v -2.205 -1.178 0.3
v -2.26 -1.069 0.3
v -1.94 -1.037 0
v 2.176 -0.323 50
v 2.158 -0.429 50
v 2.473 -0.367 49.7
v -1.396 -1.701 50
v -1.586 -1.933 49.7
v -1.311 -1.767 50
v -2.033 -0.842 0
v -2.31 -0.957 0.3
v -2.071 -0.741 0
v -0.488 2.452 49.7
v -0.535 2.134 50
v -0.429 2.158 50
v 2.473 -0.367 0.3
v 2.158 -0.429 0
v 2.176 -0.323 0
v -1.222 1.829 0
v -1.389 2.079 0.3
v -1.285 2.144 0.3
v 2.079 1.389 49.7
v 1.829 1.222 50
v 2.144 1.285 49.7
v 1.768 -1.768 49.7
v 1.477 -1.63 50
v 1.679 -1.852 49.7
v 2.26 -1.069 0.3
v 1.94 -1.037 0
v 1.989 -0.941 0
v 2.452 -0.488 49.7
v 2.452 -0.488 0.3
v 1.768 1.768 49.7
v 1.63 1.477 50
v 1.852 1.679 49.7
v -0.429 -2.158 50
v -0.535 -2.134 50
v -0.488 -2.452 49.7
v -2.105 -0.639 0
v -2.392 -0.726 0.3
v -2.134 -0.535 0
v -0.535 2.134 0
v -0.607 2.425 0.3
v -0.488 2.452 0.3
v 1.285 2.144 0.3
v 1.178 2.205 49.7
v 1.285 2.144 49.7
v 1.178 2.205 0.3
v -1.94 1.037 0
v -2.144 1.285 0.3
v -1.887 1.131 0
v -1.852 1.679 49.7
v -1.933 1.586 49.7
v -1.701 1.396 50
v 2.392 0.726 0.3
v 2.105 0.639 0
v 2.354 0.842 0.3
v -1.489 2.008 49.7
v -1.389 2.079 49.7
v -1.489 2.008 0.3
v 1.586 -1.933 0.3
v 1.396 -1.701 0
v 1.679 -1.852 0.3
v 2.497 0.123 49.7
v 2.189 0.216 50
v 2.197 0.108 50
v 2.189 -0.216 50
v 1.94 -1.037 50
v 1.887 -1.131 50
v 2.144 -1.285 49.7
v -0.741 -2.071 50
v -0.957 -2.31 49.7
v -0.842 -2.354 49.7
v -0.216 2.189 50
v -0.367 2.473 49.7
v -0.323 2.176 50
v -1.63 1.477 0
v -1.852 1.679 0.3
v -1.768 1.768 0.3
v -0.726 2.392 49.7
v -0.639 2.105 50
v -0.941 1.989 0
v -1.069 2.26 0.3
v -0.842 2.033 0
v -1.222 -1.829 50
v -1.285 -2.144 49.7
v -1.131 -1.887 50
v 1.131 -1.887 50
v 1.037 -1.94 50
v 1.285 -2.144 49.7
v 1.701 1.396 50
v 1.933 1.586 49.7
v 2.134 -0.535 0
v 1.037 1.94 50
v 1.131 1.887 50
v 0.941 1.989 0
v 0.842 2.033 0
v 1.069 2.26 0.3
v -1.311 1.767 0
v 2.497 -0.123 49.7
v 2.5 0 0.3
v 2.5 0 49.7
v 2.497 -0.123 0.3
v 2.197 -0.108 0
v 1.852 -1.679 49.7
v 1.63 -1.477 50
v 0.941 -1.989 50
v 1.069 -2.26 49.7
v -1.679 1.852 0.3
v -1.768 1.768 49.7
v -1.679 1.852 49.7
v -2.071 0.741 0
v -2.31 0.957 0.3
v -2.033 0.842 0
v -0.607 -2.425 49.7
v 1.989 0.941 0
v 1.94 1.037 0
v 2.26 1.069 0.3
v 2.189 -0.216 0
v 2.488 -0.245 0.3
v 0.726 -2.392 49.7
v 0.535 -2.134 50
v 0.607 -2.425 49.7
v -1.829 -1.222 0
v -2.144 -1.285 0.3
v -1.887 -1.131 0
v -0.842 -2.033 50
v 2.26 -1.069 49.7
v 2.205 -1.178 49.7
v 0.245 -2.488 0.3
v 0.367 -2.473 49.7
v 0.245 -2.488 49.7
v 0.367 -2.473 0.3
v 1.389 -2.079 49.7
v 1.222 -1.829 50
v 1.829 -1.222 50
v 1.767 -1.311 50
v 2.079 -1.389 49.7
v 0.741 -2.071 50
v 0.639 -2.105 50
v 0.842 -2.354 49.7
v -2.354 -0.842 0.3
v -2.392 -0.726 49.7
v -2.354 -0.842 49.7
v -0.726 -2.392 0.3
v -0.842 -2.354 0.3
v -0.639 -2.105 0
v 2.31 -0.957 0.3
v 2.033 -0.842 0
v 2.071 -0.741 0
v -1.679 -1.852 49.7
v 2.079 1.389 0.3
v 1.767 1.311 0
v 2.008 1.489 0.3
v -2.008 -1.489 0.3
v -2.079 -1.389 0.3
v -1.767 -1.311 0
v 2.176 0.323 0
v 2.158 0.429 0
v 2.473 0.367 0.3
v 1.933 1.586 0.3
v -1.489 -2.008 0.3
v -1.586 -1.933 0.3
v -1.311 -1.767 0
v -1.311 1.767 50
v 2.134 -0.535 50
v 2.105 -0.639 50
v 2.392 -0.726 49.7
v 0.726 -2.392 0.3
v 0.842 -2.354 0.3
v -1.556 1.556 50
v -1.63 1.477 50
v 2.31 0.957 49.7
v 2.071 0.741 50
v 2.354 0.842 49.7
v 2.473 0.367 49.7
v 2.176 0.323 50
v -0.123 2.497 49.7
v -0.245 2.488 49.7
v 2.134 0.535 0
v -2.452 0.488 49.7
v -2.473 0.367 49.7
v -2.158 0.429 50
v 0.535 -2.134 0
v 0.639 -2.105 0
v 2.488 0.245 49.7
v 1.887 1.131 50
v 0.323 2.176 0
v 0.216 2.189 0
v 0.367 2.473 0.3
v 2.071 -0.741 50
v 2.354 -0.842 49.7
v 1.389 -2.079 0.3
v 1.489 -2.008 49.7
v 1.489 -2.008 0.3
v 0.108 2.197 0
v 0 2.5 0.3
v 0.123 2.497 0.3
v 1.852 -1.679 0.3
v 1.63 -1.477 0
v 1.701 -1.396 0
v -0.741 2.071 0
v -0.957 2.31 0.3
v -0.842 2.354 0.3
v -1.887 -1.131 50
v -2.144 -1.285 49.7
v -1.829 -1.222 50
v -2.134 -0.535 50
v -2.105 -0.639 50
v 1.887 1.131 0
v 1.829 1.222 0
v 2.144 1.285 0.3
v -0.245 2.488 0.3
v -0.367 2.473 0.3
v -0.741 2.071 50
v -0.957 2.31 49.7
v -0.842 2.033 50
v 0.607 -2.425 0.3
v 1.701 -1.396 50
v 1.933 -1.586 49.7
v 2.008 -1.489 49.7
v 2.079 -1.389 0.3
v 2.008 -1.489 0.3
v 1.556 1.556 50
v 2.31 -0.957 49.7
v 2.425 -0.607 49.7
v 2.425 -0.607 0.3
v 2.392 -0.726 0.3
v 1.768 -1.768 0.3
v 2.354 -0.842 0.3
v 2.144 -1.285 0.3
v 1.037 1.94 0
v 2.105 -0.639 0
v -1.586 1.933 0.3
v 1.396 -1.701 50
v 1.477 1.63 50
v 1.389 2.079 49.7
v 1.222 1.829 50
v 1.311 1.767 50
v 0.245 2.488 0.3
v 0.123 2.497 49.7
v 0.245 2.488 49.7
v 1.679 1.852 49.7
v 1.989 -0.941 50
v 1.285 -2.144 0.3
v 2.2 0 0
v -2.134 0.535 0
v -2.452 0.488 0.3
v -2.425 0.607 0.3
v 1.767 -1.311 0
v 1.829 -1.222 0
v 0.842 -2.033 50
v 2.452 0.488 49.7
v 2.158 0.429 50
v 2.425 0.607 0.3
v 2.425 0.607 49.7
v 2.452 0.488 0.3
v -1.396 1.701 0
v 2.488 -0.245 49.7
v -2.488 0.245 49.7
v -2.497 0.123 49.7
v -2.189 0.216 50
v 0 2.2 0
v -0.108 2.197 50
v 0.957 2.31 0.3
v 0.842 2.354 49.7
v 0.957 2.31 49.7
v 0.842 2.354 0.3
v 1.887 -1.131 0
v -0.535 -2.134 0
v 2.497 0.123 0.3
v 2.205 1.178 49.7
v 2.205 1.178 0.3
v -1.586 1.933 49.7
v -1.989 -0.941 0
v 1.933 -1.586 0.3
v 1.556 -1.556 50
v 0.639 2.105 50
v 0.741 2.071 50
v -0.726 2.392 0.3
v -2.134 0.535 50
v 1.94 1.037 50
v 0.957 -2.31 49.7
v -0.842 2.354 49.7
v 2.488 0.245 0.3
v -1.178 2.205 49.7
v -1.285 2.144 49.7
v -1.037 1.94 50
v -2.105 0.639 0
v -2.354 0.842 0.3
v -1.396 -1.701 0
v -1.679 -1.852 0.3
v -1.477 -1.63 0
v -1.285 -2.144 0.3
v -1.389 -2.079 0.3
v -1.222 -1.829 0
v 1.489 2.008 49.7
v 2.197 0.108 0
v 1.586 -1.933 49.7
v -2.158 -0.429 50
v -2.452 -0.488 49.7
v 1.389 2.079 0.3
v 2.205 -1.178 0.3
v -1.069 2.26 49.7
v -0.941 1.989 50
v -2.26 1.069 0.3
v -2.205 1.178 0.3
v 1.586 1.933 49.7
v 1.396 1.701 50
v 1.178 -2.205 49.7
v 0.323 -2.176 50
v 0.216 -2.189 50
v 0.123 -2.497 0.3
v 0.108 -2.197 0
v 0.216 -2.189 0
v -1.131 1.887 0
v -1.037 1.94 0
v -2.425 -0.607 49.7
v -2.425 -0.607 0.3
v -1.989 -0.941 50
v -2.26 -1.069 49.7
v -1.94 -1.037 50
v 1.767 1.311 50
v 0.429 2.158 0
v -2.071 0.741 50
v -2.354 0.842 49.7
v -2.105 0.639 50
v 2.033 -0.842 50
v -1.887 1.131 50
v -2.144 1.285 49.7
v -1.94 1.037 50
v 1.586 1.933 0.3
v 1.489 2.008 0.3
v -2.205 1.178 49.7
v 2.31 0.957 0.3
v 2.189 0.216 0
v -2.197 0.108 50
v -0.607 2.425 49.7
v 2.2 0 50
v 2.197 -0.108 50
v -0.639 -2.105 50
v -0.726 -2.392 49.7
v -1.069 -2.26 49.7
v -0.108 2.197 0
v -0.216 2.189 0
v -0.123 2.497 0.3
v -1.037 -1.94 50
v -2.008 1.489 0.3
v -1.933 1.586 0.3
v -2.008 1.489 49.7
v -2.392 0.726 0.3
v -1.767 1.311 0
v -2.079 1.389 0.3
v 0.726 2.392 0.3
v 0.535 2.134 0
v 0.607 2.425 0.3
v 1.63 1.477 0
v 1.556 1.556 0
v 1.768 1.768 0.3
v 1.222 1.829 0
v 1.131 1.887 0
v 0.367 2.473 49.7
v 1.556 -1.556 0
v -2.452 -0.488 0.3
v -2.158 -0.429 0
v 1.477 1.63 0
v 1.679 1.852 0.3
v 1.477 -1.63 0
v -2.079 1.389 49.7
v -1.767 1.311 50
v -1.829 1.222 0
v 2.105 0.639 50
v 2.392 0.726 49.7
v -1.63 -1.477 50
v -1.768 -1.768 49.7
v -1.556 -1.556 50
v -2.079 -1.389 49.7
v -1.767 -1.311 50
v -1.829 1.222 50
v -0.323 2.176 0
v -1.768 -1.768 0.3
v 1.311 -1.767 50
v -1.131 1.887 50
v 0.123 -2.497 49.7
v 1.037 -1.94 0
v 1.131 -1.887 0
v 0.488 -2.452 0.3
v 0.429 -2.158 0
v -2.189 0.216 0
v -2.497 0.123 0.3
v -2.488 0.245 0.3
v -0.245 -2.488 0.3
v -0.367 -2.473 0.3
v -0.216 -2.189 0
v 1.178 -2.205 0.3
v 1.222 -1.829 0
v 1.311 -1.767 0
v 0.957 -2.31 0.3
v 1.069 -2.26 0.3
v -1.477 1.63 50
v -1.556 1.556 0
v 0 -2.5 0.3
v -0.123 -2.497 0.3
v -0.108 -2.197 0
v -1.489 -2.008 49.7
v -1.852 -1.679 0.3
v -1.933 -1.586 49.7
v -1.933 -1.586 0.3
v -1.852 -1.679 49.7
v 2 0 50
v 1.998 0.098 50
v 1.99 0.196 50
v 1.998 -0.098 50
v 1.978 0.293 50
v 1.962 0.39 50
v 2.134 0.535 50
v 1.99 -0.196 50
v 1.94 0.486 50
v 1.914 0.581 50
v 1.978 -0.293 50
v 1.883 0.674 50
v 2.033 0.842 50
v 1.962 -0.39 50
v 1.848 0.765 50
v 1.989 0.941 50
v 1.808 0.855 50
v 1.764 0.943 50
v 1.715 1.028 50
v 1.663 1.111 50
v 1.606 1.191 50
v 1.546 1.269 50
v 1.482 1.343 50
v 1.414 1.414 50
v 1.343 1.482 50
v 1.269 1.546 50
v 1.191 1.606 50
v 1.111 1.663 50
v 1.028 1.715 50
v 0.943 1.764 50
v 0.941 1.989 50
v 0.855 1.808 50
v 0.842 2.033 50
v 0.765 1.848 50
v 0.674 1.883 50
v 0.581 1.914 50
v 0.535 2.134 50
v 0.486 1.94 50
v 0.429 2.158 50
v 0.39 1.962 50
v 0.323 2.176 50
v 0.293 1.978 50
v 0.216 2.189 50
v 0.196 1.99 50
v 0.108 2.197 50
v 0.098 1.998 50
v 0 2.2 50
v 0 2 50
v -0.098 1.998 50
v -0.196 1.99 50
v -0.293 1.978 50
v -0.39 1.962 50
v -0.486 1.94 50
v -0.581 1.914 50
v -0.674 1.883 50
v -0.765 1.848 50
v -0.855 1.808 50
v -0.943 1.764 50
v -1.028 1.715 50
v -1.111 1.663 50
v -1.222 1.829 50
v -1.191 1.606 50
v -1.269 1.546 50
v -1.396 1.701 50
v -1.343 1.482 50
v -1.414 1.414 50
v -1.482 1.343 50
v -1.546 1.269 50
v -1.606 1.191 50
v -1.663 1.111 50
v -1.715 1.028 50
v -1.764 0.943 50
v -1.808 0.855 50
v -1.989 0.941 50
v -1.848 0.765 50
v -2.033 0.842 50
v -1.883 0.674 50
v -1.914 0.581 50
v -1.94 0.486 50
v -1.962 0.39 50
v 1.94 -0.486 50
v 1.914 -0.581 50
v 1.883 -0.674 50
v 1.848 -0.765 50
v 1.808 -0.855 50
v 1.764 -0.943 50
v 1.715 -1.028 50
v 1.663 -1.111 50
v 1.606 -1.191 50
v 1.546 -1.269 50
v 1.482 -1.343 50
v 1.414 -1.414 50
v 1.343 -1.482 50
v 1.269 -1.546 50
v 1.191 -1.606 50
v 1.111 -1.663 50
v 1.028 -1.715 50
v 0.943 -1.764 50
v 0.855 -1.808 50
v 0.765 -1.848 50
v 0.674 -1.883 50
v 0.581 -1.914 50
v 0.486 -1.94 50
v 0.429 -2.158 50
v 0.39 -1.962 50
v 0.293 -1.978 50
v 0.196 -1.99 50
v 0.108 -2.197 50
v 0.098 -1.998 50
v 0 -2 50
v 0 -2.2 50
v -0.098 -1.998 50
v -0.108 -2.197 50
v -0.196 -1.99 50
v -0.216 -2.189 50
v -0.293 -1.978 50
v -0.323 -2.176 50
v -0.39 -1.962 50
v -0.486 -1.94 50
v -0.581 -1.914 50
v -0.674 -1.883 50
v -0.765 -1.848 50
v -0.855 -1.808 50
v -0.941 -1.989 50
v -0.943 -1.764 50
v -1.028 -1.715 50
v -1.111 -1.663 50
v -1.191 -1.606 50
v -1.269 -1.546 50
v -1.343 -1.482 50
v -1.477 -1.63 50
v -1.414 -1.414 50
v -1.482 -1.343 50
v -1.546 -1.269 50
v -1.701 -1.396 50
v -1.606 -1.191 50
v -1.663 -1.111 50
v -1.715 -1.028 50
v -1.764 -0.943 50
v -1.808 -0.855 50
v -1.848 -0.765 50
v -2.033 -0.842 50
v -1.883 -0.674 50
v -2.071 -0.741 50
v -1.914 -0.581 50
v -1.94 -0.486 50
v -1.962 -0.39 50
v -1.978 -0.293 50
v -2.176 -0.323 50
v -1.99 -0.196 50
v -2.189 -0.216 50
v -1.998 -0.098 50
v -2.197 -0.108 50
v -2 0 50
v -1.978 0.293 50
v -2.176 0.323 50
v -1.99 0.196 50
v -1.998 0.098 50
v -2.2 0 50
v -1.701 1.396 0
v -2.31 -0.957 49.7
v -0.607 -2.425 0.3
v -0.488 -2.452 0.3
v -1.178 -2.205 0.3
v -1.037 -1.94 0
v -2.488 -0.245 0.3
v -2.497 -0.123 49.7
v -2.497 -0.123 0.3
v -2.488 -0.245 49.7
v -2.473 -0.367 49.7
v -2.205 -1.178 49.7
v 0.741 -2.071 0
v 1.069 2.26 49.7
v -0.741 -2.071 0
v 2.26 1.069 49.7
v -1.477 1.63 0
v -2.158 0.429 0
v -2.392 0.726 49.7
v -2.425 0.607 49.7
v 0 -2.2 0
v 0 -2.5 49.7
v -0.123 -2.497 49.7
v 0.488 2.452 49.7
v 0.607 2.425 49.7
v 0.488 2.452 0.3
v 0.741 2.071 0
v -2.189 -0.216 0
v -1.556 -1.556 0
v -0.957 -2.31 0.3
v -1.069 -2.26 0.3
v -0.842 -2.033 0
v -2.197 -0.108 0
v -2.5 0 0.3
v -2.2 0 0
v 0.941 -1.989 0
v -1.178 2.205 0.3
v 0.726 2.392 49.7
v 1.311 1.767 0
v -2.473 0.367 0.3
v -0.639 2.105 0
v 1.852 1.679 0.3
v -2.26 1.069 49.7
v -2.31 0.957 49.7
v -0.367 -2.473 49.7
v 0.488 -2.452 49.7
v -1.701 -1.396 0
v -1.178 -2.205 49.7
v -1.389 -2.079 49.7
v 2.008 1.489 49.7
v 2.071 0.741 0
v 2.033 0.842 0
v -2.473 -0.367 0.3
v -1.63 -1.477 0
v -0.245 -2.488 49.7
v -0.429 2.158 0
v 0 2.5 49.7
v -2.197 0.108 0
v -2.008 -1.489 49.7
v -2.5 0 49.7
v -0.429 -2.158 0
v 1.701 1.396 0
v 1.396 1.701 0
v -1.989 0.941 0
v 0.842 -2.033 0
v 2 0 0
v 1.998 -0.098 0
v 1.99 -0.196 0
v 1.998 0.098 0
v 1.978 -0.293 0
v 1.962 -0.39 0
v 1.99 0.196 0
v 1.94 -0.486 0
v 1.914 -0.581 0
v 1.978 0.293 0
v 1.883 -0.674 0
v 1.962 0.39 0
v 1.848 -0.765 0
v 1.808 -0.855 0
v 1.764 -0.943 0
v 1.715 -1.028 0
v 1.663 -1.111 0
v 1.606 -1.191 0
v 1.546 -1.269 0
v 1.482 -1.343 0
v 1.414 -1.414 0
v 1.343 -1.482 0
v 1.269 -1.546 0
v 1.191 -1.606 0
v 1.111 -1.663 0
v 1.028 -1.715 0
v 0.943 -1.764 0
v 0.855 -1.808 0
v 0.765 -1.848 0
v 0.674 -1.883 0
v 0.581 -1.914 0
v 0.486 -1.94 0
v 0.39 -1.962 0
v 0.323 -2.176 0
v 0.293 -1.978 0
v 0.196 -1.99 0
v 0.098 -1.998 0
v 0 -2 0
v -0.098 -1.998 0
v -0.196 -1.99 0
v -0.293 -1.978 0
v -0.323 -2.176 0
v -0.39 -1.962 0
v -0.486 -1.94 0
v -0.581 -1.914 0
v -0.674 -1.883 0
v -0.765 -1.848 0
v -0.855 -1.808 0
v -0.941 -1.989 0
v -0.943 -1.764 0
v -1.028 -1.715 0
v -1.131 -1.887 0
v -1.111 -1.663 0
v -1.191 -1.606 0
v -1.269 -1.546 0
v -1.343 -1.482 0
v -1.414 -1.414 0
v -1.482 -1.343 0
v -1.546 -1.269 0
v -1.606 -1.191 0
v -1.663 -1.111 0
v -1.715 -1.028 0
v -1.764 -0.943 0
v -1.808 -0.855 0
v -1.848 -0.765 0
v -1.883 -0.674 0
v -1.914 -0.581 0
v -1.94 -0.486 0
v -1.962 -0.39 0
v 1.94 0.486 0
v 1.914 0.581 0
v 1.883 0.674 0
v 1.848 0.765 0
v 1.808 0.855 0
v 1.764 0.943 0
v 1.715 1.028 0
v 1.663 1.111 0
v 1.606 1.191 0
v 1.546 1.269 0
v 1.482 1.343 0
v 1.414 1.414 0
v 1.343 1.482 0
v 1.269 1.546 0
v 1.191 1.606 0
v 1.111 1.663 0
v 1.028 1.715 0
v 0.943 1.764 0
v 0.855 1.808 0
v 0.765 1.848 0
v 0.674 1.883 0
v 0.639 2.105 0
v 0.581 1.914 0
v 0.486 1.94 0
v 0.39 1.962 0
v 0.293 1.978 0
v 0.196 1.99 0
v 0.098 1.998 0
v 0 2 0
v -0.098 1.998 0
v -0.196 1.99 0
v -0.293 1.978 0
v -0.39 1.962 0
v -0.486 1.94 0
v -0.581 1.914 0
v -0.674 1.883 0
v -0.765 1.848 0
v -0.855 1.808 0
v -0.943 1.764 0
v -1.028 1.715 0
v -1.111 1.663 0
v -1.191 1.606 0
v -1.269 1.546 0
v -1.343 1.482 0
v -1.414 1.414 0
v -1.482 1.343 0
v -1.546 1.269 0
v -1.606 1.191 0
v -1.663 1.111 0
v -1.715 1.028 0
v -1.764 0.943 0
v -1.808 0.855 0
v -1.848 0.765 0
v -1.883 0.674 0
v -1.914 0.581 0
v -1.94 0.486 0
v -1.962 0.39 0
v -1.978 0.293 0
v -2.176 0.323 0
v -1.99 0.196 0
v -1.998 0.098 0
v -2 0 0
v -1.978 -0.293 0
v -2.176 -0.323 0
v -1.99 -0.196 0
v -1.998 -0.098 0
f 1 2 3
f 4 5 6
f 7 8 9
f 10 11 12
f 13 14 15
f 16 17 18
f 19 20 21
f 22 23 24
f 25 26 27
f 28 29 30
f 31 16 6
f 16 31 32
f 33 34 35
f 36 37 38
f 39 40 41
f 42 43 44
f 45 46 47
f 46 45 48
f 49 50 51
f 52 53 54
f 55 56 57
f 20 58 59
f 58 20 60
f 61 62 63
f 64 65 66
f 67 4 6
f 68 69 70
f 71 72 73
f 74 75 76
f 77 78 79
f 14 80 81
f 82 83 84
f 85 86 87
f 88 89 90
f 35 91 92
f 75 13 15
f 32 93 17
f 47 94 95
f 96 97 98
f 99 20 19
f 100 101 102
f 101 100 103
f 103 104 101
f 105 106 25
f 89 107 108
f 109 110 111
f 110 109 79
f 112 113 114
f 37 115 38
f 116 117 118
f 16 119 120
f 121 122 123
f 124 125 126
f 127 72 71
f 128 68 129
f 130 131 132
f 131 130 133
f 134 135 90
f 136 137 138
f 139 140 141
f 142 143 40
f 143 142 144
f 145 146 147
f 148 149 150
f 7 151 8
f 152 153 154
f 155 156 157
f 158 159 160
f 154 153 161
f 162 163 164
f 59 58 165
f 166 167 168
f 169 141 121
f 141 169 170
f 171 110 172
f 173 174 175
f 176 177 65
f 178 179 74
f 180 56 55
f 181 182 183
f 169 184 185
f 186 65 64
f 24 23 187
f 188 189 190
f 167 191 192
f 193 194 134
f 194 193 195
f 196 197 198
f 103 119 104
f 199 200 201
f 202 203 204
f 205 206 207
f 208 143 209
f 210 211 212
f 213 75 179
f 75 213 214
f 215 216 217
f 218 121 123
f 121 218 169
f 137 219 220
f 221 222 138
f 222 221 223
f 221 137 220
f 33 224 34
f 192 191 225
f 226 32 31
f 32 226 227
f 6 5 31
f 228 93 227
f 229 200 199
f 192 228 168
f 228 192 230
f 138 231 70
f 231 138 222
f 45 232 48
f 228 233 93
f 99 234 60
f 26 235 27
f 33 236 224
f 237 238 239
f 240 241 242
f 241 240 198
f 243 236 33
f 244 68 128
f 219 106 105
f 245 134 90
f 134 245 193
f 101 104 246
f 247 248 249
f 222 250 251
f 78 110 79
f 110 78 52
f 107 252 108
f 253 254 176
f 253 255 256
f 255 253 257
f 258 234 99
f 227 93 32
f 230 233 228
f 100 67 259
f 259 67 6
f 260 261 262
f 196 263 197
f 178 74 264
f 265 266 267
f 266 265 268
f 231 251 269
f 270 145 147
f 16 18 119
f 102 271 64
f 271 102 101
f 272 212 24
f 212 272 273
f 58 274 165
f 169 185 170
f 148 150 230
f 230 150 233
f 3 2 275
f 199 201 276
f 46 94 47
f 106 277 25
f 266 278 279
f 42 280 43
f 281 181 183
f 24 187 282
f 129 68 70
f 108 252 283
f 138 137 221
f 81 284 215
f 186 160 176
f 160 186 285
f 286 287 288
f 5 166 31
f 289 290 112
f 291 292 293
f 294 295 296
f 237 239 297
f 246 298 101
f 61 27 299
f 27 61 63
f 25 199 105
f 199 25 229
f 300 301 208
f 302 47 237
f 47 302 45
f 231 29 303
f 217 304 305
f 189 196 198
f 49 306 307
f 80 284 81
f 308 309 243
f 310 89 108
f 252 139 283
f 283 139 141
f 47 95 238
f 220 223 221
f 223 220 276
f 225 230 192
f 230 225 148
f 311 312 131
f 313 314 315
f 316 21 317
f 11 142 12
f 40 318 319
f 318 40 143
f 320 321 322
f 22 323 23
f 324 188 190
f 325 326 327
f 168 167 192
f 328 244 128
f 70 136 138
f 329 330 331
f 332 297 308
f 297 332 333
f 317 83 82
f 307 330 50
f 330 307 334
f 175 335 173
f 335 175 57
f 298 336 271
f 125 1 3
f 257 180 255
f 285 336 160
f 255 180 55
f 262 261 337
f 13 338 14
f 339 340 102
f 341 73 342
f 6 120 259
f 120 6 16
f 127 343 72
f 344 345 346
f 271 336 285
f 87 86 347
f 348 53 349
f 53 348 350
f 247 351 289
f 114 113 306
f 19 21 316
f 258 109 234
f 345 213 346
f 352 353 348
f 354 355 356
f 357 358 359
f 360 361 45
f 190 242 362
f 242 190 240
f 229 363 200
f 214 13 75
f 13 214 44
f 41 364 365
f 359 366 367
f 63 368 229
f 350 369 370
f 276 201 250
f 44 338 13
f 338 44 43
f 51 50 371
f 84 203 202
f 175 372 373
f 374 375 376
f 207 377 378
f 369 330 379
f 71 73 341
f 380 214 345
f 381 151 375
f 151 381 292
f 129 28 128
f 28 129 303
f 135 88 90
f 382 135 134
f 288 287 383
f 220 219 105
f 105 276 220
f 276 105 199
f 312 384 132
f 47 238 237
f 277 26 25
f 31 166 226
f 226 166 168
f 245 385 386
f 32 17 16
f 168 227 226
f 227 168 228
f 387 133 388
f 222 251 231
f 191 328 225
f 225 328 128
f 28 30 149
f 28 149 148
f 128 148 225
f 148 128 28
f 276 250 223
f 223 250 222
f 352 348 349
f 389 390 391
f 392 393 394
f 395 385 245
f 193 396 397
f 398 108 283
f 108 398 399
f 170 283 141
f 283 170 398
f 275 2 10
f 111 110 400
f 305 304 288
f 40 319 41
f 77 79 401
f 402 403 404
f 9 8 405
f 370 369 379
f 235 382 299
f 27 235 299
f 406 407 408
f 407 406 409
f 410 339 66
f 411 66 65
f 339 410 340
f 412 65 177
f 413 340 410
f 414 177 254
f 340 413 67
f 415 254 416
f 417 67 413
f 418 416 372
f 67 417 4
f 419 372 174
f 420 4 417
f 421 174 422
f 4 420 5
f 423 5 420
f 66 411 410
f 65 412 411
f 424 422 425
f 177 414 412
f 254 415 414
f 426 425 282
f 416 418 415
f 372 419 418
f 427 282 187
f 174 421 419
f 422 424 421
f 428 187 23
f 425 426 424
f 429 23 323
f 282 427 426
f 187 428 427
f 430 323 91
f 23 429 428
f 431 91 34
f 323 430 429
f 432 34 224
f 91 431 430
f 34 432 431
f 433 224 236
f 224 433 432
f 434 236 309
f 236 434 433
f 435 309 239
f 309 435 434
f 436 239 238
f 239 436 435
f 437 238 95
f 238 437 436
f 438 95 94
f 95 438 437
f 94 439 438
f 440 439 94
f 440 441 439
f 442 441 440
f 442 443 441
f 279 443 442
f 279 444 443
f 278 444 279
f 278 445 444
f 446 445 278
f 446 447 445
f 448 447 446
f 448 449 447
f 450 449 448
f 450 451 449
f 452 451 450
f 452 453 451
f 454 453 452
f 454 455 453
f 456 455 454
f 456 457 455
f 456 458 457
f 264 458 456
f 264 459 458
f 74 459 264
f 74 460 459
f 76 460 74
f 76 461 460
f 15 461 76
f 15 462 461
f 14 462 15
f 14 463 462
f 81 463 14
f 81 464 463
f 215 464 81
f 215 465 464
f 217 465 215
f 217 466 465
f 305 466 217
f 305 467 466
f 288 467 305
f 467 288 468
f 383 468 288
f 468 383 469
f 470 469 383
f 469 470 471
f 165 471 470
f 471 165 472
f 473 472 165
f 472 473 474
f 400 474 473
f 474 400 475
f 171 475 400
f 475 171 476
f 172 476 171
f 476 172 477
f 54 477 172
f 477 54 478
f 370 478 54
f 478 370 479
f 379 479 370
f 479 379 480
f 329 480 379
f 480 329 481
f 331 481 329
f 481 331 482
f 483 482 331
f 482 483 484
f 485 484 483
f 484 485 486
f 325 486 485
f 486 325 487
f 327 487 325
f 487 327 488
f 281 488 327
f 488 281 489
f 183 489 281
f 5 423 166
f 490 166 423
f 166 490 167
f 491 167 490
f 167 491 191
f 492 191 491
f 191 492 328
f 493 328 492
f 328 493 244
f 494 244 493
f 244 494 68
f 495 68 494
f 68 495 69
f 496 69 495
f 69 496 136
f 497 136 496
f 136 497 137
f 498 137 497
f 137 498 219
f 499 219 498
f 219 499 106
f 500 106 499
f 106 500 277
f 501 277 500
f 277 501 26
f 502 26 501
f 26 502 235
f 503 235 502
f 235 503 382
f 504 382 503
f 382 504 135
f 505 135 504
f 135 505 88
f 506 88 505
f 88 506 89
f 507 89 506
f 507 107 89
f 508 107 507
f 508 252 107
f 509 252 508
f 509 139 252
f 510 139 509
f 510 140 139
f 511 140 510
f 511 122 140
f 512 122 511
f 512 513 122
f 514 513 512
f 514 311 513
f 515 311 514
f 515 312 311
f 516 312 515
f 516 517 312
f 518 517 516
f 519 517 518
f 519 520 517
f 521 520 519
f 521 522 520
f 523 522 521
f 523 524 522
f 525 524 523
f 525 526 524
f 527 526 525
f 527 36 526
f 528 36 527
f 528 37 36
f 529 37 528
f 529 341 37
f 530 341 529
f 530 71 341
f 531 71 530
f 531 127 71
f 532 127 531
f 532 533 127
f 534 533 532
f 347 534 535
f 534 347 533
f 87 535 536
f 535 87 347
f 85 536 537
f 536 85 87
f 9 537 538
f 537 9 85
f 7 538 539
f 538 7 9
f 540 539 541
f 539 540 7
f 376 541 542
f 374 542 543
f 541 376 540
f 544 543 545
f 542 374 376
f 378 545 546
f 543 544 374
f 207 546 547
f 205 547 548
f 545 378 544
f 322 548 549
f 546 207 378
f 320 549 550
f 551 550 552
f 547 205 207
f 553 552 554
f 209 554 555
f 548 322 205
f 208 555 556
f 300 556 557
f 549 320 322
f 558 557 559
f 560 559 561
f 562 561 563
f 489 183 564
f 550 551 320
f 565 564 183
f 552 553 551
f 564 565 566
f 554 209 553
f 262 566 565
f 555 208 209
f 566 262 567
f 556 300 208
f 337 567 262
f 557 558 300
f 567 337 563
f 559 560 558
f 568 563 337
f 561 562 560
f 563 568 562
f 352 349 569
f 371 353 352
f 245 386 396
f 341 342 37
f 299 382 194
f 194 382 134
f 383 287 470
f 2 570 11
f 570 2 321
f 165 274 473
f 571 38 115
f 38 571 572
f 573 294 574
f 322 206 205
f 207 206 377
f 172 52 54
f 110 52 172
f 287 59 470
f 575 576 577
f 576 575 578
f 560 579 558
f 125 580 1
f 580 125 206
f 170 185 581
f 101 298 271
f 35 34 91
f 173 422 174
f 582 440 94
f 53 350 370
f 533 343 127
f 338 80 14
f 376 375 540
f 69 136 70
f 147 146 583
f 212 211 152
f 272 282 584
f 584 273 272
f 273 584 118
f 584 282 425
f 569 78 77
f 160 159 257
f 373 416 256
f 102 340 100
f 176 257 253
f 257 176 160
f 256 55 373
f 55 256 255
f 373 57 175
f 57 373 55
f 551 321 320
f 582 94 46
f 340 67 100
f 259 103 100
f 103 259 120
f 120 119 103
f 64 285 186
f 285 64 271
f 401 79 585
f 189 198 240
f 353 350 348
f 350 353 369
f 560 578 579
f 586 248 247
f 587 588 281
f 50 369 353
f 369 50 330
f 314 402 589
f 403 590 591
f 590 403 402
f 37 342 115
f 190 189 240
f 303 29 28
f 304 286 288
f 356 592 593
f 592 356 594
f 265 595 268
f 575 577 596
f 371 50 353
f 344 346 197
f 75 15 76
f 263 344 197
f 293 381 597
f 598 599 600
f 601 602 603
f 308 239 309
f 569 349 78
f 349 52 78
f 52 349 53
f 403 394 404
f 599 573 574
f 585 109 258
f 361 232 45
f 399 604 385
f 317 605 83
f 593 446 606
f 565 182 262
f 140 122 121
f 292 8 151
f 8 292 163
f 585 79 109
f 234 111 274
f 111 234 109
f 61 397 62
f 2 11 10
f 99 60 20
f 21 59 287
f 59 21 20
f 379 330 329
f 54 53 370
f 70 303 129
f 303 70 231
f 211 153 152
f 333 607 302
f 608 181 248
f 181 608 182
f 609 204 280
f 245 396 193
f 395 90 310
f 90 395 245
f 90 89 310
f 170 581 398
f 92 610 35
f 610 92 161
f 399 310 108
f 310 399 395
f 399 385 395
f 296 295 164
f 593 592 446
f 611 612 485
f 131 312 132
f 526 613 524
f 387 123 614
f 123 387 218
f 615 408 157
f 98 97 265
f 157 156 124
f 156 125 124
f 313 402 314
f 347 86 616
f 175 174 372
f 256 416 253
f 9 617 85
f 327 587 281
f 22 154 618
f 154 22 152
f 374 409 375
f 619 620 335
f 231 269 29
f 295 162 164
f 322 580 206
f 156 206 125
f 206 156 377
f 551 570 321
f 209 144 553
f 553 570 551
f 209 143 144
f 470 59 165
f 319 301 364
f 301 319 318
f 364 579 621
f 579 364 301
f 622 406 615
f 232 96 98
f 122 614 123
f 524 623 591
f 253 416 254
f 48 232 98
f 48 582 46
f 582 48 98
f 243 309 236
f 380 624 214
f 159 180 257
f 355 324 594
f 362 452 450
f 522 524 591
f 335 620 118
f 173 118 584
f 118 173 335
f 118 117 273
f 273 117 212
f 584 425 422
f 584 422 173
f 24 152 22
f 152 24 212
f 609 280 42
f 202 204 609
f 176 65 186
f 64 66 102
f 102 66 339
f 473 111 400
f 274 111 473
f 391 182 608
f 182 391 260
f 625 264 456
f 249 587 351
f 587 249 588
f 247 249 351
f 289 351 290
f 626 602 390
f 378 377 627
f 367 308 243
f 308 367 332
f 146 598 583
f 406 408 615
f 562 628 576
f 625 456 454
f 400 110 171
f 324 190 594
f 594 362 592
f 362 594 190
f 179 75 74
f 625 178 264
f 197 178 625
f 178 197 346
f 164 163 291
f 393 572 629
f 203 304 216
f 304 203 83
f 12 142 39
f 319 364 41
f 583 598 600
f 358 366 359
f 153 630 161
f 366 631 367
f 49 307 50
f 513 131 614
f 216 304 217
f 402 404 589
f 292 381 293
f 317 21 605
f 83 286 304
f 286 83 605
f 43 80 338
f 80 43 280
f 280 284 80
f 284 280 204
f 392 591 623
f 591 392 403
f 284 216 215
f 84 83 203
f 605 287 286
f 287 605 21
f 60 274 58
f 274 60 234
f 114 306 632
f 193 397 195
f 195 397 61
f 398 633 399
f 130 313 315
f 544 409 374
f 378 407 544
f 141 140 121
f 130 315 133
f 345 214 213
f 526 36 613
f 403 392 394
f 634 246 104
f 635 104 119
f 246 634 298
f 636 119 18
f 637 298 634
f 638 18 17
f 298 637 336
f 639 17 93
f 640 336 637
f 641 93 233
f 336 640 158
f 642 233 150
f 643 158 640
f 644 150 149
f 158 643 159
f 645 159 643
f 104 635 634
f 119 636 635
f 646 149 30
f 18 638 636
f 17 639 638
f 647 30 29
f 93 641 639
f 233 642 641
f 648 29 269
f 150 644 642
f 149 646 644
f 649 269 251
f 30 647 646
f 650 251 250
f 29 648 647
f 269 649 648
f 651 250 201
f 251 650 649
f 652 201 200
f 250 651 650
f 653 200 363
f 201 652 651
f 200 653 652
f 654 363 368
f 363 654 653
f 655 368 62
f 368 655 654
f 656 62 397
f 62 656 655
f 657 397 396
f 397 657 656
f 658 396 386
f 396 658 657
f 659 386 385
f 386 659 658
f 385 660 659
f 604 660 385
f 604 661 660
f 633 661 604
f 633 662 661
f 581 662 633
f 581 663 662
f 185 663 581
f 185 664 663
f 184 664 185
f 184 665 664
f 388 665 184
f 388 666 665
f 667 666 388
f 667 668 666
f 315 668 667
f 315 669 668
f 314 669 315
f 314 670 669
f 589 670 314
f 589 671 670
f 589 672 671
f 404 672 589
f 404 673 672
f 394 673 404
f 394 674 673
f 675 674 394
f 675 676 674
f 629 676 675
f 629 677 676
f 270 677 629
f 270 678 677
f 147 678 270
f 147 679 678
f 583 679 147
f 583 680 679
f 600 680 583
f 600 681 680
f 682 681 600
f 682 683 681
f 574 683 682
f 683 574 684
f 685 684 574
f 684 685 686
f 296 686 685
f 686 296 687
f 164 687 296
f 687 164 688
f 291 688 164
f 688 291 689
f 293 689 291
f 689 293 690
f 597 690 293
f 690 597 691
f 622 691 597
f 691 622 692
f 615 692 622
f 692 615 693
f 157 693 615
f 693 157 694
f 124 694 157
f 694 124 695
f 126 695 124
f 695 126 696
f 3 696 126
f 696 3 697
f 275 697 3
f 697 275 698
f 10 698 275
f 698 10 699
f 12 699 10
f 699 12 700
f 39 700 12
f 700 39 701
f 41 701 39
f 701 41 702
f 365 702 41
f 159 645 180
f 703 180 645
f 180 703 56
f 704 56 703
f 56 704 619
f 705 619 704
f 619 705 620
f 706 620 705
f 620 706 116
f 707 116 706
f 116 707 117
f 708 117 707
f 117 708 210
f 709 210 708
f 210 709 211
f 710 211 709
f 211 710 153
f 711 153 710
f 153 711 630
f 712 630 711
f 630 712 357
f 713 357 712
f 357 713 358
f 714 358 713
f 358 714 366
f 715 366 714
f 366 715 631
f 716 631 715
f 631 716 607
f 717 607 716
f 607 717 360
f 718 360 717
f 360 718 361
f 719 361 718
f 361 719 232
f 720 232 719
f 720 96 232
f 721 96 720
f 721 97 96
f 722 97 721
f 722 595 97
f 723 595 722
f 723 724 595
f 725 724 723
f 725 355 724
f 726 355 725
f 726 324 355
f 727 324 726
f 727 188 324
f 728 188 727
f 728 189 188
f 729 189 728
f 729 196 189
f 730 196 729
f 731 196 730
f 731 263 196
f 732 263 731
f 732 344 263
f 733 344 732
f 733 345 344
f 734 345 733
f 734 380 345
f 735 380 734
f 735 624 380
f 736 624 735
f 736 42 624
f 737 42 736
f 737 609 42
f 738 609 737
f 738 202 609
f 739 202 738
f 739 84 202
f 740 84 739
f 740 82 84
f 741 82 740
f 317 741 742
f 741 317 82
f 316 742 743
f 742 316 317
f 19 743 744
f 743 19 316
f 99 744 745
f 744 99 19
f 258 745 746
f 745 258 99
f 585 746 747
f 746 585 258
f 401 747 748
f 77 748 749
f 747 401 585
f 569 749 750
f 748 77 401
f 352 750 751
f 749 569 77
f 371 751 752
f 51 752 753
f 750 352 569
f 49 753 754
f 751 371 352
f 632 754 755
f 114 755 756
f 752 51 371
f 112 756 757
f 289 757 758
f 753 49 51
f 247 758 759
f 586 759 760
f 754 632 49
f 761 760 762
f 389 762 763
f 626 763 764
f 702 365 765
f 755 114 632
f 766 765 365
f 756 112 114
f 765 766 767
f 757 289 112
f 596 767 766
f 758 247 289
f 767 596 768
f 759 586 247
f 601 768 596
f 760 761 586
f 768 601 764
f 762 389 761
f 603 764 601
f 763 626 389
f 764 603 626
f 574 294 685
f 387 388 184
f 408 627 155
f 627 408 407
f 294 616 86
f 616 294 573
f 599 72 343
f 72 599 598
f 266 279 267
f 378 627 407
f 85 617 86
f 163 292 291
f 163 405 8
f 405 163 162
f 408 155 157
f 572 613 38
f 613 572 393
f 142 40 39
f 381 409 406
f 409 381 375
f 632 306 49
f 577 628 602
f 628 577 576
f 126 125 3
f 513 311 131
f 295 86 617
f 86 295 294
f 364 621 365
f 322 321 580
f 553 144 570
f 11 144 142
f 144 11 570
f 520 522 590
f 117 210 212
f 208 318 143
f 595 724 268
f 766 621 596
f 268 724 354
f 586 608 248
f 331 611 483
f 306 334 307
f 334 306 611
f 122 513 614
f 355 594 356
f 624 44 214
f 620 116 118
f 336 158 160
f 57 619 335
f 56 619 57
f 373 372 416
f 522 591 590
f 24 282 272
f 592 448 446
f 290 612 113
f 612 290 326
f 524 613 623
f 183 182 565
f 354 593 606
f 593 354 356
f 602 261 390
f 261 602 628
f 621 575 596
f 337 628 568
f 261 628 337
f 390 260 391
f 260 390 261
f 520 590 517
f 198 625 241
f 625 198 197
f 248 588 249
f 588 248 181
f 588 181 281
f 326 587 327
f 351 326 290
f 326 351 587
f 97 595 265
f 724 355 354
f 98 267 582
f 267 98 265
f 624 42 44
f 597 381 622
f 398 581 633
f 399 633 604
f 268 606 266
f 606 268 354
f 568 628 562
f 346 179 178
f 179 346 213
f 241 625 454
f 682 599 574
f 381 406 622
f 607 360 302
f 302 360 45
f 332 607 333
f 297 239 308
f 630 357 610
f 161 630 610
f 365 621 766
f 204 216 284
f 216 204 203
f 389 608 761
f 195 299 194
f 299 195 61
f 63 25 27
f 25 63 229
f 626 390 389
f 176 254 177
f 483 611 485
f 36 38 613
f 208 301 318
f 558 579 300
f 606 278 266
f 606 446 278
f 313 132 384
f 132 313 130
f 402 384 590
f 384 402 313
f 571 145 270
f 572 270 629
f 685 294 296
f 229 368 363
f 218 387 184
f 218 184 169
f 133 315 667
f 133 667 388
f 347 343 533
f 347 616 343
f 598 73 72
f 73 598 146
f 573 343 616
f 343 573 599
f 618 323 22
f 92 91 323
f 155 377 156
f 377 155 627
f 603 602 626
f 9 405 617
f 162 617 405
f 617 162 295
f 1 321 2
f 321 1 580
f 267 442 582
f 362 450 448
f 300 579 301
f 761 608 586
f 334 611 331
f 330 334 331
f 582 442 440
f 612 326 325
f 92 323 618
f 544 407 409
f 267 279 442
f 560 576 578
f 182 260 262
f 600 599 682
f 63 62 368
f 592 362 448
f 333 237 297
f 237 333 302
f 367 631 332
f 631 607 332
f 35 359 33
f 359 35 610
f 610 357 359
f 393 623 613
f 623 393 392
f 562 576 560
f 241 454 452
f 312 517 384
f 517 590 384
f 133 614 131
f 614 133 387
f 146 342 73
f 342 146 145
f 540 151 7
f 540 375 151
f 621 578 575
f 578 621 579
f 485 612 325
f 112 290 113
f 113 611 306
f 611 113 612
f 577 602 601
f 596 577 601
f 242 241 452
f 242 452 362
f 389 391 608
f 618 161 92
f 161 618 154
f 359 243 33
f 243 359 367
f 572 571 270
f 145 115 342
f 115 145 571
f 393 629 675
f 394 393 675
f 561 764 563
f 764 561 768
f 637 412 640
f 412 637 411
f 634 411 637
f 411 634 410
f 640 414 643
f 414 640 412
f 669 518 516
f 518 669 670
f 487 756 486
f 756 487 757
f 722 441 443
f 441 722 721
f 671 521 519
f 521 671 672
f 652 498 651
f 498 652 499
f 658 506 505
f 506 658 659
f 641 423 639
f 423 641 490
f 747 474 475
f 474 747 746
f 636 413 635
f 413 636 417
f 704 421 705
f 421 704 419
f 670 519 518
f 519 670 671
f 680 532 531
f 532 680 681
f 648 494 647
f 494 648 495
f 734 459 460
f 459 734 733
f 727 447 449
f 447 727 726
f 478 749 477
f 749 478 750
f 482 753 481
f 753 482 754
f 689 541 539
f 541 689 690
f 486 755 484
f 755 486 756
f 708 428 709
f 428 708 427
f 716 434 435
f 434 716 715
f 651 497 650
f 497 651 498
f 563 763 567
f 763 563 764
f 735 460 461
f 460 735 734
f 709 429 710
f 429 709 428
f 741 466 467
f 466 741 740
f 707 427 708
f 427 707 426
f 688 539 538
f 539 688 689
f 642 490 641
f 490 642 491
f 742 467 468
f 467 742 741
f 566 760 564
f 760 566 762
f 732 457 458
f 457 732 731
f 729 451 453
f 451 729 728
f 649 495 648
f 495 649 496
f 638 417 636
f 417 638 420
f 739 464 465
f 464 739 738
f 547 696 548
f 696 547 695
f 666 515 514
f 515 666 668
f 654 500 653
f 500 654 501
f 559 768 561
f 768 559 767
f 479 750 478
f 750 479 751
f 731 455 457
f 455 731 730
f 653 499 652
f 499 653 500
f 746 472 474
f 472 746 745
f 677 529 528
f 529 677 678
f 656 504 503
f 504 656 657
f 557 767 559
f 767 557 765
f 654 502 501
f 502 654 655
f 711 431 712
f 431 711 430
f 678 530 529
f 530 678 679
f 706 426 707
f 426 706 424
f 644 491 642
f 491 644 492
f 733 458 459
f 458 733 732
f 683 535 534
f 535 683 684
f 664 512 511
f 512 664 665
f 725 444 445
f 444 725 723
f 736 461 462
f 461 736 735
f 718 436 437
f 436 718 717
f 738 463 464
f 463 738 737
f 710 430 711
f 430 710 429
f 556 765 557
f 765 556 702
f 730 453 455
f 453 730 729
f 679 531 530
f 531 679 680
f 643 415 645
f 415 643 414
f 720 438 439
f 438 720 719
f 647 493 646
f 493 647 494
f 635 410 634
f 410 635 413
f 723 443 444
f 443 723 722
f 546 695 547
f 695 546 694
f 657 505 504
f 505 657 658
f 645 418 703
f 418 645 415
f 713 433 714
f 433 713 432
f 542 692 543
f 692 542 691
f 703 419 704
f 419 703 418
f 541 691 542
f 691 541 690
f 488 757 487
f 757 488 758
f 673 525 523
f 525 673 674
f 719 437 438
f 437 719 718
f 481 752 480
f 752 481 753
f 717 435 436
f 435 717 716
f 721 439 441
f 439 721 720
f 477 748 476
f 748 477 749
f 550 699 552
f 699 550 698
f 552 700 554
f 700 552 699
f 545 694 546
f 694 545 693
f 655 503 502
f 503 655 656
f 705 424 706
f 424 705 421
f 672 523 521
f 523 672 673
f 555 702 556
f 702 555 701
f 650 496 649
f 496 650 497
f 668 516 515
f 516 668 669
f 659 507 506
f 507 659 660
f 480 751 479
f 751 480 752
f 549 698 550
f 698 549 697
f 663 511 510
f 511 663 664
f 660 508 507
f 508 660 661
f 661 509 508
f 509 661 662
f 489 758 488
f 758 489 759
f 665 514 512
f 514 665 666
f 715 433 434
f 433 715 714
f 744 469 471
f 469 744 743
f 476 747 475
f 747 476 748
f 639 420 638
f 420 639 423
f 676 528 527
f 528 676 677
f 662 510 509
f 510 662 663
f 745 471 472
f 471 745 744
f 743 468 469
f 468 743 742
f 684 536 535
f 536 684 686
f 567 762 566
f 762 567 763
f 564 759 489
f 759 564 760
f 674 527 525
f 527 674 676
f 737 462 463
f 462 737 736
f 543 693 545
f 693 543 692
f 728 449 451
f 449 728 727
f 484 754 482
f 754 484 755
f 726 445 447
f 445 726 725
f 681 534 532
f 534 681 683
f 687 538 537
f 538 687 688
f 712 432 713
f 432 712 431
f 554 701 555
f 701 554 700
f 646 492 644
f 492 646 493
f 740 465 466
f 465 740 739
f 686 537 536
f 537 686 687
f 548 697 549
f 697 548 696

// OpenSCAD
$fn = 128;

// PTFE heatshrink sleeving (simple hollow tube model)
// Units: mm

// Parameters
length = 50;          // overall length of sleeving
id = 4.0;             // inner diameter (before/after shrink as modeled)
wall = 0.5;           // wall thickness
od = id + 2*wall;     // outer diameter

// Optional: slight end chamfer to mimic cut tubing
chamfer = 0.3;        // set to 0 for square ends

module tube(L, ID, OD, chamfer=0) {
    difference() {
        // Outer body with optional chamfer
        if (chamfer > 0) {
            hull() {
                translate([0,0,0]) cylinder(h=0.01, d=OD - 2*chamfer);
                translate([0,0,chamfer]) cylinder(h=L - 2*chamfer, d=OD);
                translate([0,0,L-0.01]) cylinder(h=0.01, d=OD - 2*chamfer);
            }
        } else {
            cylinder(h=L, d=OD);
        }

        // Inner bore (slightly extended to ensure clean subtraction)
        translate([0,0,-0.5]) cylinder(h=L+1.0, d=ID);
    }
}

tube(length, id, od, chamfer);
